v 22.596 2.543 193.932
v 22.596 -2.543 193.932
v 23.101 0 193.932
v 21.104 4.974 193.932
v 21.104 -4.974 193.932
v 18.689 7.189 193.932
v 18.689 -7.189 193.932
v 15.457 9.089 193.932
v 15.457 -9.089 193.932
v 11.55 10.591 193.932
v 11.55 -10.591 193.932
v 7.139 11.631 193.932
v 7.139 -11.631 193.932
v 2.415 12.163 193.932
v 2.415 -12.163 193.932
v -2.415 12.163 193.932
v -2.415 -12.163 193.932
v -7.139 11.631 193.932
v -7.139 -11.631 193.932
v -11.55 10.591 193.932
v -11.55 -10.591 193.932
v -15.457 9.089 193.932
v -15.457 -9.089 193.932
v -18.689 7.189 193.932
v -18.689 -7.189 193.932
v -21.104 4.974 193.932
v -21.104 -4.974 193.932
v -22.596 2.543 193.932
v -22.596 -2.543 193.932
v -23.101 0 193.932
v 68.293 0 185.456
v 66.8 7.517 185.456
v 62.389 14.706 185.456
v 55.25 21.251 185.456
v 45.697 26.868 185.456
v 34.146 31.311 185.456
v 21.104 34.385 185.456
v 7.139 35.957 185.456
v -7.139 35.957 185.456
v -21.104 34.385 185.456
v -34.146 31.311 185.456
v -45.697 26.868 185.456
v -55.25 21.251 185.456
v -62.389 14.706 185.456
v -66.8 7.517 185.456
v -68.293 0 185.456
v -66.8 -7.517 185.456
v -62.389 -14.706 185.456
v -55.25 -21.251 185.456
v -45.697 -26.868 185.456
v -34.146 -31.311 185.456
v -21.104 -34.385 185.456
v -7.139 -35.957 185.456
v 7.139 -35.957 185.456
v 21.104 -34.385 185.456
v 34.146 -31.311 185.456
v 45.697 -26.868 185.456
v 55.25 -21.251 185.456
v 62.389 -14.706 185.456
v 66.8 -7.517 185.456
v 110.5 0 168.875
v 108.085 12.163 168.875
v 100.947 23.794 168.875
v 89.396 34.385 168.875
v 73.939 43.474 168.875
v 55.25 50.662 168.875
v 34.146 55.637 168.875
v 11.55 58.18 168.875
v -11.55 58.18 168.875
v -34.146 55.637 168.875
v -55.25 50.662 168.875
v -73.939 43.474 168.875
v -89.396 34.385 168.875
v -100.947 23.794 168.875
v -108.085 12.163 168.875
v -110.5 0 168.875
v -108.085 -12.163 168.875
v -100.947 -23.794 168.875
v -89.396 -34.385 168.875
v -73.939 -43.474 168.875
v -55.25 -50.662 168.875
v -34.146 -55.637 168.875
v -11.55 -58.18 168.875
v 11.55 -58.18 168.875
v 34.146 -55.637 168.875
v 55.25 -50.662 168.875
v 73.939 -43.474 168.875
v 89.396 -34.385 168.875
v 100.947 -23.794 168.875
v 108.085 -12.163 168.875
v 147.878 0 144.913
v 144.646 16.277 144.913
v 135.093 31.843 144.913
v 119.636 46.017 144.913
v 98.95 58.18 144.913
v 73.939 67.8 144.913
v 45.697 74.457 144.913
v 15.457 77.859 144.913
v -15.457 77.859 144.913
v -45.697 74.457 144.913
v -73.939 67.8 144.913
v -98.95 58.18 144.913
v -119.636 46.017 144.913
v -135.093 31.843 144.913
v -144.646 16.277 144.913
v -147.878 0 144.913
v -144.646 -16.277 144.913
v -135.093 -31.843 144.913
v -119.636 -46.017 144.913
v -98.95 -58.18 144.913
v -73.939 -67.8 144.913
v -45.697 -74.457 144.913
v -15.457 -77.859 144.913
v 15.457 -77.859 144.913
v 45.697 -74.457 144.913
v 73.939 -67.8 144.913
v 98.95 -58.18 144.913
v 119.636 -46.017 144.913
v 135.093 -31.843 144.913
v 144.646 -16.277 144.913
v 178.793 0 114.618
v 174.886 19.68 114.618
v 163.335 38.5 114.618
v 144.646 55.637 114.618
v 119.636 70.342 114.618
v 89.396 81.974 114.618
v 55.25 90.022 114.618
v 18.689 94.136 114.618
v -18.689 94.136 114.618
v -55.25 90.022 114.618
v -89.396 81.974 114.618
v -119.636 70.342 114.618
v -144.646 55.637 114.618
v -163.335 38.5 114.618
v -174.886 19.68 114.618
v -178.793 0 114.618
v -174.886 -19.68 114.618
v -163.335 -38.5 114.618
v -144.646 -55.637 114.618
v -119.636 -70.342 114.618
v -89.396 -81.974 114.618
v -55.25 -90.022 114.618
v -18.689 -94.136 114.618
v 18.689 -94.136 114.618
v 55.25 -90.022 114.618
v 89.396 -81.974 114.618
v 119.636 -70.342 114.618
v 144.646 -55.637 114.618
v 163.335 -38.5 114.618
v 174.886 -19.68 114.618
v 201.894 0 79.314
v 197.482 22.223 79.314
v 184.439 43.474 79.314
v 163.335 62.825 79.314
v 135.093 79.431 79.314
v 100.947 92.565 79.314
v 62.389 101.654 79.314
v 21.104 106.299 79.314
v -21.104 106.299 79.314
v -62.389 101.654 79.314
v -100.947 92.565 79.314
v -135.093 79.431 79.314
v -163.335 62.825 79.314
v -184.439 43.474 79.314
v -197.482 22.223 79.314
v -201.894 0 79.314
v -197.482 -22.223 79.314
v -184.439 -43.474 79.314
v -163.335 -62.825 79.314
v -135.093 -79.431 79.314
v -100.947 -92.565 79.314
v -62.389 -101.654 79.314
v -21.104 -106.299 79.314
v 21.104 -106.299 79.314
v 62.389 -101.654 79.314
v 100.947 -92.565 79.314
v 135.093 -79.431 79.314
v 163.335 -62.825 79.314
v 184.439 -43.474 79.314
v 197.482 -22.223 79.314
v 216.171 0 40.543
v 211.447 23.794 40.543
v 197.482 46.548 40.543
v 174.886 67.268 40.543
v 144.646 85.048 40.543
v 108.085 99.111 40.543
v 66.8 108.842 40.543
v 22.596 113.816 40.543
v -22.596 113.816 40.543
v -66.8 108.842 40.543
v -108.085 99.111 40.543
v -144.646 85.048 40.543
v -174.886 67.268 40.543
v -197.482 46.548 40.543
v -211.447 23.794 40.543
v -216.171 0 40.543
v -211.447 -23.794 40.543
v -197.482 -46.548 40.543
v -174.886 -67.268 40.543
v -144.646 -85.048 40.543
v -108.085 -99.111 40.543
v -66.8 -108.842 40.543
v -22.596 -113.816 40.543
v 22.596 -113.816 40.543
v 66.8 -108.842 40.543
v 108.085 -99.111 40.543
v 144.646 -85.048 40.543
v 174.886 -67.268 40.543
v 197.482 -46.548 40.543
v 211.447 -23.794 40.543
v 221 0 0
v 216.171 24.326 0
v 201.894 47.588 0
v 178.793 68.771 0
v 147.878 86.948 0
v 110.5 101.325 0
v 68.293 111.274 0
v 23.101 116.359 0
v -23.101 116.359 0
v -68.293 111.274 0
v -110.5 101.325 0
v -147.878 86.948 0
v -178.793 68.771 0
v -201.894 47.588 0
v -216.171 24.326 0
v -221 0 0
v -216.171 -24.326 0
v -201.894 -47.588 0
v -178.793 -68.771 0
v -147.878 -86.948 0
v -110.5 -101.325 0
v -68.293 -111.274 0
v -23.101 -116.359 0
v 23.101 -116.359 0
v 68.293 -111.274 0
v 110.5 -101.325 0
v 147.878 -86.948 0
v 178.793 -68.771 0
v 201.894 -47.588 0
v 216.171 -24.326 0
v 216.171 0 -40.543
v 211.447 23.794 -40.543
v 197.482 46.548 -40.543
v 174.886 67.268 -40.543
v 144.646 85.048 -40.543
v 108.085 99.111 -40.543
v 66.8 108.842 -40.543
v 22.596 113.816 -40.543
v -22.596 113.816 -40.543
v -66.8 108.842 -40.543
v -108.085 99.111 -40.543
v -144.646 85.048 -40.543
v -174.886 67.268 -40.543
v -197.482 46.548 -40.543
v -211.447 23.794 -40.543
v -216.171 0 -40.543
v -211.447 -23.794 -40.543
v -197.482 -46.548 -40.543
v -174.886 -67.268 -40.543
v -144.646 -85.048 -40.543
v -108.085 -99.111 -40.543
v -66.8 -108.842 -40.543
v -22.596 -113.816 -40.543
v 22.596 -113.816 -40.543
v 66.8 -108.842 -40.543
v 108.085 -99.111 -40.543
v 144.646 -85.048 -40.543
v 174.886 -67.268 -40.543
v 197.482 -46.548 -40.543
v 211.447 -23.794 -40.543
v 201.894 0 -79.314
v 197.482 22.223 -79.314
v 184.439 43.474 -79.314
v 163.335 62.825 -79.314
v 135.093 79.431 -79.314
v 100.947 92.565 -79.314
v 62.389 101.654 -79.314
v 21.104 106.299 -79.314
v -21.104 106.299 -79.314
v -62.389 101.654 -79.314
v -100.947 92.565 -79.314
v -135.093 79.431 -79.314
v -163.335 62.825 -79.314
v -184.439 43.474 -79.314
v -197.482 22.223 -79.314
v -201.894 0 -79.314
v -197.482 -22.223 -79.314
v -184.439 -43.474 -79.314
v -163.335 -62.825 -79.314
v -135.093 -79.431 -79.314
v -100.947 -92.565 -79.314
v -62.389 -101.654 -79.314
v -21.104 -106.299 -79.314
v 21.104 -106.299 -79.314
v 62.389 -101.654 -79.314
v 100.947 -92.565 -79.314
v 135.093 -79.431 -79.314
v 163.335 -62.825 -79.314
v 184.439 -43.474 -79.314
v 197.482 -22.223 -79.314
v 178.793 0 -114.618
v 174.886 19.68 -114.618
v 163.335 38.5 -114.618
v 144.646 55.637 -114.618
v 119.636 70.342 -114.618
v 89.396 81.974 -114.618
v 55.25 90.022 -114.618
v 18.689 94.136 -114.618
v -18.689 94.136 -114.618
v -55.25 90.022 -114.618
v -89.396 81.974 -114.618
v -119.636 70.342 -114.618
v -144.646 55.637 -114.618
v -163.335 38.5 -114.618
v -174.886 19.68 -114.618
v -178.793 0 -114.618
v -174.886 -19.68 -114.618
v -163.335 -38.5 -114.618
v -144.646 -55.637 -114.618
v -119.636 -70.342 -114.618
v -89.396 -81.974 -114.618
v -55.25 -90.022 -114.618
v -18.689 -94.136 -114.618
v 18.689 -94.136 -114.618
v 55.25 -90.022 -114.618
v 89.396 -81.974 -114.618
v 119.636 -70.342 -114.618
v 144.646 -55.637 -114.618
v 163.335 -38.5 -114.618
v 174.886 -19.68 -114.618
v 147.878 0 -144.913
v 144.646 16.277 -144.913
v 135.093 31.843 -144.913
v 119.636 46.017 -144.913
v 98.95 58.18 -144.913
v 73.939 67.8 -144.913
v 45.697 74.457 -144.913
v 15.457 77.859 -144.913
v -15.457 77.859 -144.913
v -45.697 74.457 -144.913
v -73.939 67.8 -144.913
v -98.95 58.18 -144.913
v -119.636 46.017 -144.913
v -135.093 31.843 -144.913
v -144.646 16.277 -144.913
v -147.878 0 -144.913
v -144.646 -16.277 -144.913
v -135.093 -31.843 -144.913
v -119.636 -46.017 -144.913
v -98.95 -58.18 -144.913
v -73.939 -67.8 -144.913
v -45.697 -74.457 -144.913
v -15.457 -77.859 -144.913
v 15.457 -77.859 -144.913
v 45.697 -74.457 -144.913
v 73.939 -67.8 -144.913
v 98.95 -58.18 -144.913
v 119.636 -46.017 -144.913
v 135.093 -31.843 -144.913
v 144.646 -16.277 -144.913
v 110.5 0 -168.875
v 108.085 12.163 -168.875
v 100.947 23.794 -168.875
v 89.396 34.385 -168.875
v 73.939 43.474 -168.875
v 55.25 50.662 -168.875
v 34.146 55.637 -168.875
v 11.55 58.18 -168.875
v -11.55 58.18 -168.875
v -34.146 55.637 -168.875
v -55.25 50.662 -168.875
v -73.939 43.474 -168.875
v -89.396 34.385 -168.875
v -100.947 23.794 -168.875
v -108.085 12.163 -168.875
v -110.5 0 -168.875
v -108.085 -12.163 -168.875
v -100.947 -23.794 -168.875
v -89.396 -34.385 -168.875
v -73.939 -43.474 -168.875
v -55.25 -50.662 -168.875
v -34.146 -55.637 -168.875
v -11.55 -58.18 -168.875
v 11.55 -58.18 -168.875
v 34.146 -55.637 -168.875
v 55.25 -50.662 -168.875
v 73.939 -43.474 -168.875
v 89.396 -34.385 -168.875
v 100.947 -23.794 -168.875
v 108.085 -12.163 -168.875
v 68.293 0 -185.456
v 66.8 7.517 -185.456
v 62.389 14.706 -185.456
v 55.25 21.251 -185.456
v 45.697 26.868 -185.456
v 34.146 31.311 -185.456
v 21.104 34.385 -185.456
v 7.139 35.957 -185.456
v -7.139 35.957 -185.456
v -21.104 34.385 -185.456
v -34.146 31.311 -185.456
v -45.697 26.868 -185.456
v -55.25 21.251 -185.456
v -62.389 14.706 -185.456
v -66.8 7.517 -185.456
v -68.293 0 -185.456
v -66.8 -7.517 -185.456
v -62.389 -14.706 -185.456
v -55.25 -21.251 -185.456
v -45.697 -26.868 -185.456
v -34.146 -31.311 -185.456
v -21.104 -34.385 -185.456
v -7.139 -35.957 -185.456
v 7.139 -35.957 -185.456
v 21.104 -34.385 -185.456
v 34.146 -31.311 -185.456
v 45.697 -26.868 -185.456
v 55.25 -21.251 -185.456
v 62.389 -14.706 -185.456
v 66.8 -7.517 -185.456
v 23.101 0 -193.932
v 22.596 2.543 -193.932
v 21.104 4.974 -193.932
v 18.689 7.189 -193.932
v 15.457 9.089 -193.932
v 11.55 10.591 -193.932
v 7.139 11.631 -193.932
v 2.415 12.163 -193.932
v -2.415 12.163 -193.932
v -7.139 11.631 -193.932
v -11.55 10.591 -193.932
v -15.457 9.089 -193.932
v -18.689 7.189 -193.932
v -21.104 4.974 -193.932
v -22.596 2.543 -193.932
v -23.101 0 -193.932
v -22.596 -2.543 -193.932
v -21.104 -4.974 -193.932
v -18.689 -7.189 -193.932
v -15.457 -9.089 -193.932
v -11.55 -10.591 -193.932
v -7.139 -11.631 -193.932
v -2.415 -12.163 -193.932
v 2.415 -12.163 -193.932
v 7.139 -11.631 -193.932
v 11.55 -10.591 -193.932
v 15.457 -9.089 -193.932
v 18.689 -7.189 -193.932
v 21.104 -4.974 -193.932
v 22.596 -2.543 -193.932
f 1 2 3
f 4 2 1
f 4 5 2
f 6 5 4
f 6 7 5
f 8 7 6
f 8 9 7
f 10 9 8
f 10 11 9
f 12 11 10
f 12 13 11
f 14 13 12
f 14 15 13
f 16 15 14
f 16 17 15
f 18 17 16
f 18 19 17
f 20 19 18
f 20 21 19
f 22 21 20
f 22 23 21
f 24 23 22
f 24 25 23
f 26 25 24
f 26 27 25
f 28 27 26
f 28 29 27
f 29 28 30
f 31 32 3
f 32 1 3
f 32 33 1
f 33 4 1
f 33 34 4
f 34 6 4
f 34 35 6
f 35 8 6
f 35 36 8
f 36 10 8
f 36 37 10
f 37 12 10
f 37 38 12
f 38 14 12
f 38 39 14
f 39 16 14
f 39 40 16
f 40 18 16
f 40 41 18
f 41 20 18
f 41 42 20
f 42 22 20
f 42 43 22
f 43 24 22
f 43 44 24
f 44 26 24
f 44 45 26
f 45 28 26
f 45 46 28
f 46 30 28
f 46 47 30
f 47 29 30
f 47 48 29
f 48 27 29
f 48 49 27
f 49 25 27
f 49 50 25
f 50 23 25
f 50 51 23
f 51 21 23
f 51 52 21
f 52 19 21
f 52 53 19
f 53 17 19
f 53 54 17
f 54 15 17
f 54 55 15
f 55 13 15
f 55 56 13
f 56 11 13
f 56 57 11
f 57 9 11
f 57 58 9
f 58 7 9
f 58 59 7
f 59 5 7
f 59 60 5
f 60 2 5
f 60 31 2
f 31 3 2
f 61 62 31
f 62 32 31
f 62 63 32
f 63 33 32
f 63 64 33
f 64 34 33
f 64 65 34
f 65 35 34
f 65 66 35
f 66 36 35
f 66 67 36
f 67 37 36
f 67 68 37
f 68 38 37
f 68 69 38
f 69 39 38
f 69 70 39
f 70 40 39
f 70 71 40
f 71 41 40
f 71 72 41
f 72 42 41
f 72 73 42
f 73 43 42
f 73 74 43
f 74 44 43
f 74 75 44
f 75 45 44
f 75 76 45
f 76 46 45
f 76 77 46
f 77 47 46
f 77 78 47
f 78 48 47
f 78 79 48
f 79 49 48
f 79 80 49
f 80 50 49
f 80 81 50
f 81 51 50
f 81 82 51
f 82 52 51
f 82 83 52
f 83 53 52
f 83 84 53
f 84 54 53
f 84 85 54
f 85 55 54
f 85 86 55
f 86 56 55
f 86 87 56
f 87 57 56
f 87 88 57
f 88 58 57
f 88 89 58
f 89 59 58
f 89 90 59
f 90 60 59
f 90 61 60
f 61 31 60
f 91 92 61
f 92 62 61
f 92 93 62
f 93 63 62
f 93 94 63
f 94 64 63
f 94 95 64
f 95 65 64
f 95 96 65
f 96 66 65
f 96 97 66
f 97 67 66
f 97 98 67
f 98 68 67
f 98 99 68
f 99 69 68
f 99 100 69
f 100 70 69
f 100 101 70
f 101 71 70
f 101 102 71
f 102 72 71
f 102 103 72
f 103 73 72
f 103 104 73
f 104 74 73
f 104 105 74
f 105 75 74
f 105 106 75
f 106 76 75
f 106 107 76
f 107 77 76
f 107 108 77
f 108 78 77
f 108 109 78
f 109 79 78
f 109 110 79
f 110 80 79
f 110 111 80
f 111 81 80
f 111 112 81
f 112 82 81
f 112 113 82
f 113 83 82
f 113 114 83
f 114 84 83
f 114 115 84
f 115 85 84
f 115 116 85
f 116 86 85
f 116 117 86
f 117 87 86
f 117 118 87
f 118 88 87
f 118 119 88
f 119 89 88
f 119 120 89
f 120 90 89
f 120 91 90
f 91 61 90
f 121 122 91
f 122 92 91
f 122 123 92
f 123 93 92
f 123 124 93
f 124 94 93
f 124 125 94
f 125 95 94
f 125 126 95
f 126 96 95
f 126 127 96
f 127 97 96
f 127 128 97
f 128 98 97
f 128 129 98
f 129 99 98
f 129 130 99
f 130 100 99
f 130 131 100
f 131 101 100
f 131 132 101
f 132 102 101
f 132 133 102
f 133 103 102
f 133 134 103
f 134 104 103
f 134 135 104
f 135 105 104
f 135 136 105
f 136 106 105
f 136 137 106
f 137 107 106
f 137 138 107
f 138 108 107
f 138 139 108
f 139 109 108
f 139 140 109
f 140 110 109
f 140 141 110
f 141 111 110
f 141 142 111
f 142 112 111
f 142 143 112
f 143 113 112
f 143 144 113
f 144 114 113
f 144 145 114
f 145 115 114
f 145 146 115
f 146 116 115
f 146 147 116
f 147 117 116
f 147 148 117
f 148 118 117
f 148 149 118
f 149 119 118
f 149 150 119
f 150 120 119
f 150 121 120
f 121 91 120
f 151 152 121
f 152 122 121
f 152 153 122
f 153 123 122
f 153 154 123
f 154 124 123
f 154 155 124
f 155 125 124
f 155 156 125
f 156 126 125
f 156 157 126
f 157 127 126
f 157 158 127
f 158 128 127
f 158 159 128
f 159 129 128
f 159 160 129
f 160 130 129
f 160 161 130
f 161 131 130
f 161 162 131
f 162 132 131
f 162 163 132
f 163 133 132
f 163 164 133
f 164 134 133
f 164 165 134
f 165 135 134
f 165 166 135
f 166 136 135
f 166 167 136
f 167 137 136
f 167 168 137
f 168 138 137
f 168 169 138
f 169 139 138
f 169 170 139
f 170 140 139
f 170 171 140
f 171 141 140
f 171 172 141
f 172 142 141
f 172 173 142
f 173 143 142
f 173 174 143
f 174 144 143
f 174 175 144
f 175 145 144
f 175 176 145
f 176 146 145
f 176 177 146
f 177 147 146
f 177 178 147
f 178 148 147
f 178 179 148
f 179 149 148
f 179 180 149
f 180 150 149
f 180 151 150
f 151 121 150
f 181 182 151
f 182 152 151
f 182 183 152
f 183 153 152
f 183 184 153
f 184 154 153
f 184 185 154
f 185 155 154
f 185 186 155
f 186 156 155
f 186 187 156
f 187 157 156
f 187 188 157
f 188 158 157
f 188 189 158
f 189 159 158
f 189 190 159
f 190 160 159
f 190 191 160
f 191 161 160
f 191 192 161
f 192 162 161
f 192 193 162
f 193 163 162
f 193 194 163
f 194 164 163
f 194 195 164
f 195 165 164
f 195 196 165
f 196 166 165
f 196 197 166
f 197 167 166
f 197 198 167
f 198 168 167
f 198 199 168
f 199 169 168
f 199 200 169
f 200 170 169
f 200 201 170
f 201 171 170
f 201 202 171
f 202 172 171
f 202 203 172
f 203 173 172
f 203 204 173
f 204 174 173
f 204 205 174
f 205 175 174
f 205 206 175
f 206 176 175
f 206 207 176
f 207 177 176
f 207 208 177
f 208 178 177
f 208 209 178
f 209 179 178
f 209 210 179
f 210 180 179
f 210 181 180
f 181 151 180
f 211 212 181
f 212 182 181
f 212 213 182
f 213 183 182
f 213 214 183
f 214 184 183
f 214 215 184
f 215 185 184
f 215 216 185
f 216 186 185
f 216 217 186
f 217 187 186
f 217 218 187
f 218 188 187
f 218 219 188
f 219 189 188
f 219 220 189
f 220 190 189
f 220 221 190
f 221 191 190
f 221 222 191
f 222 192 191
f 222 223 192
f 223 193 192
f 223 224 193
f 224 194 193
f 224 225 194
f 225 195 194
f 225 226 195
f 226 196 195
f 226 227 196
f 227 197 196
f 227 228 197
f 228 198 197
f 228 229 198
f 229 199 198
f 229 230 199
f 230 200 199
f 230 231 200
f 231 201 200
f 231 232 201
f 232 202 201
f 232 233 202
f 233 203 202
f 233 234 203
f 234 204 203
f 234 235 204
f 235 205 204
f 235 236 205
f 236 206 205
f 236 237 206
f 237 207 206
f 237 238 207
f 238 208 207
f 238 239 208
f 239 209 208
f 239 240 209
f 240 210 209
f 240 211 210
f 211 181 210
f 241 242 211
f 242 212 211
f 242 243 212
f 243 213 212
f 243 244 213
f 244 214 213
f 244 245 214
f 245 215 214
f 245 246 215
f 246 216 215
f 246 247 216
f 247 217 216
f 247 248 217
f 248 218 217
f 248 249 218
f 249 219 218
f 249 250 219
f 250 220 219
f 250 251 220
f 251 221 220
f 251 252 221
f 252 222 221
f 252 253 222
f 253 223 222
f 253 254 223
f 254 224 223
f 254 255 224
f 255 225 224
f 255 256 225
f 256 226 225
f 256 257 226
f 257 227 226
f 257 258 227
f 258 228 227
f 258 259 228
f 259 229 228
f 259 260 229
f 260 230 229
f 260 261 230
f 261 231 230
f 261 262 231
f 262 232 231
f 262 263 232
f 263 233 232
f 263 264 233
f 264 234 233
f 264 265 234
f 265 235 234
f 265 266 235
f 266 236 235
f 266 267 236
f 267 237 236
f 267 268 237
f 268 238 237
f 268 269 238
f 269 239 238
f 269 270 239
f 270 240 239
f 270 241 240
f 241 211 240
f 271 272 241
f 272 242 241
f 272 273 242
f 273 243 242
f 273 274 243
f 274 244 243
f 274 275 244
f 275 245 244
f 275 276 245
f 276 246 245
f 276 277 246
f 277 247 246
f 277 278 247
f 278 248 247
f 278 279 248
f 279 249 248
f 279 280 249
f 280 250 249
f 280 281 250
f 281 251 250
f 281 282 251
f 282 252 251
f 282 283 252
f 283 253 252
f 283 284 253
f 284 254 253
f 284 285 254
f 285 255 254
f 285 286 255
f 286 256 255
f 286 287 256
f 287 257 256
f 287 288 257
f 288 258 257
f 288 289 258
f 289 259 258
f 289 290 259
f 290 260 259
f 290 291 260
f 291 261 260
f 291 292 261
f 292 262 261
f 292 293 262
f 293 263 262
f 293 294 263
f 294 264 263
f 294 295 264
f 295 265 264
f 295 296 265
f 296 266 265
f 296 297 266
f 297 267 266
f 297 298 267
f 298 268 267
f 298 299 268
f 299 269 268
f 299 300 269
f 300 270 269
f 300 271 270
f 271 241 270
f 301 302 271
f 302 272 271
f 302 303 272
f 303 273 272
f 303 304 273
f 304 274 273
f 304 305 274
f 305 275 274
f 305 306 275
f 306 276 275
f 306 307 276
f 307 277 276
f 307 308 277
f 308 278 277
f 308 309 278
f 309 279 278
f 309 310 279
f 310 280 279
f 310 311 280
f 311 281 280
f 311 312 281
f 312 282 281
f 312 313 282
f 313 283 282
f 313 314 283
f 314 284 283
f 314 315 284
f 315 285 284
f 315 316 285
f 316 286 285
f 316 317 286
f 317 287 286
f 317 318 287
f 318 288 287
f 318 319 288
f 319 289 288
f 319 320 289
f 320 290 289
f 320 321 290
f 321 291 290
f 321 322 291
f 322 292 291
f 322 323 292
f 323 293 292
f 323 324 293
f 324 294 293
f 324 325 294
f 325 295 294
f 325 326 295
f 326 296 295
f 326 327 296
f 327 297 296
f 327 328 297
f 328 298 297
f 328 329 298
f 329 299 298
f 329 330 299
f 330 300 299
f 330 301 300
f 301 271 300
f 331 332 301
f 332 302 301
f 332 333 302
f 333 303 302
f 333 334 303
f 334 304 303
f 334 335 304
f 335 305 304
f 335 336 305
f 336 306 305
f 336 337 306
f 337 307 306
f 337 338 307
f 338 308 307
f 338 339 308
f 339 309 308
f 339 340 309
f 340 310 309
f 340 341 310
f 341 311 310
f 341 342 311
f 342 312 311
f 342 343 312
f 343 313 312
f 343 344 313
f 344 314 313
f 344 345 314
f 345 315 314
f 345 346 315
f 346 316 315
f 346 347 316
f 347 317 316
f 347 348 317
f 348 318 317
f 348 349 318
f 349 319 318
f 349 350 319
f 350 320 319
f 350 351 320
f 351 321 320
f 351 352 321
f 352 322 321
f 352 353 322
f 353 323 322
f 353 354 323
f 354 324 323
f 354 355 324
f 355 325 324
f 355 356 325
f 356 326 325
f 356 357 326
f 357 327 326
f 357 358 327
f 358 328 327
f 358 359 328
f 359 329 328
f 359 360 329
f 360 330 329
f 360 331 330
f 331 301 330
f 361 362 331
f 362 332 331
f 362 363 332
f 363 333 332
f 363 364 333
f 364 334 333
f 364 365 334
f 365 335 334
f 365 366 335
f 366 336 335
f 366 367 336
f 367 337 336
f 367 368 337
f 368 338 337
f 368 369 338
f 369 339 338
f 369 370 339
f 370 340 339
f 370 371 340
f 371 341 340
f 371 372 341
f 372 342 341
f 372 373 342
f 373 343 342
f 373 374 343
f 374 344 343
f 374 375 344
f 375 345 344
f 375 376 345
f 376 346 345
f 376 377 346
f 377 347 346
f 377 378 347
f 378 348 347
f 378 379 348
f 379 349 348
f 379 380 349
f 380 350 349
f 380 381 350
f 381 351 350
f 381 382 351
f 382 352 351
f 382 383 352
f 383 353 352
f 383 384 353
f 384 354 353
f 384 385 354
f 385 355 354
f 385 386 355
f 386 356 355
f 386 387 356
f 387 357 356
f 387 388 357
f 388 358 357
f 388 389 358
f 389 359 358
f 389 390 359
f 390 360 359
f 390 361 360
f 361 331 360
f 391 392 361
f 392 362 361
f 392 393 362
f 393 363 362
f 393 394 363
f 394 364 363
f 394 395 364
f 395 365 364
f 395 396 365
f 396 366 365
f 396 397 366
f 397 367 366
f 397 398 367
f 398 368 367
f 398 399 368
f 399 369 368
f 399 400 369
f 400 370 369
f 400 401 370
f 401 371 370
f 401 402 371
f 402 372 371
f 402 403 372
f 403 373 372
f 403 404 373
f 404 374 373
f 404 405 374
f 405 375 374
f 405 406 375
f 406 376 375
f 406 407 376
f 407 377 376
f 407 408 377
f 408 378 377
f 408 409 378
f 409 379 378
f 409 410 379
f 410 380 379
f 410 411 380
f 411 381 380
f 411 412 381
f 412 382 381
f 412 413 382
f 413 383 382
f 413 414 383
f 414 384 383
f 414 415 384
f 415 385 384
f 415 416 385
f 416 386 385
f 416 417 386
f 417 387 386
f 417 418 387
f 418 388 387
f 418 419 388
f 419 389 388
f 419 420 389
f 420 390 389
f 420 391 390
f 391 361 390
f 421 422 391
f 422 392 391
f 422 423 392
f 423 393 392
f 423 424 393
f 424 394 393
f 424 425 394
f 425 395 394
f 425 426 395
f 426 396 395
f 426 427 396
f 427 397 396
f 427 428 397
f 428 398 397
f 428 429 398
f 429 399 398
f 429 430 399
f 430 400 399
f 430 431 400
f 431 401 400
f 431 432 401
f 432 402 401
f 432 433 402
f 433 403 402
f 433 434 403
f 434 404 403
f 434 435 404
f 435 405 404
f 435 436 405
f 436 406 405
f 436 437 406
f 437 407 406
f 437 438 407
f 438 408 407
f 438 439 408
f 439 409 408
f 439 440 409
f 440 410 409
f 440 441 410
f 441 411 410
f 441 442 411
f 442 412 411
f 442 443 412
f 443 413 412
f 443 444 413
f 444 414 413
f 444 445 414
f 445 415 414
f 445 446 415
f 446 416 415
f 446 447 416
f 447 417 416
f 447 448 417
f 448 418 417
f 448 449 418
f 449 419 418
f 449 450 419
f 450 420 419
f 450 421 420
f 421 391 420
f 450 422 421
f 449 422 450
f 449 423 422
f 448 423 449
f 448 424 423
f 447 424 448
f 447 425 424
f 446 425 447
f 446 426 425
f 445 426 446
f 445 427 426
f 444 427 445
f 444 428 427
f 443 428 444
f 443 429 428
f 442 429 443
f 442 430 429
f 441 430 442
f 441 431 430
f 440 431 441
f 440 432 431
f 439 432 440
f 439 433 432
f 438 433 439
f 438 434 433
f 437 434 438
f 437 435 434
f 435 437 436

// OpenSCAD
// Generated by SolidPython 1.0.1 on 2020-07-29 00:46:53


scale(v = [17, 9, 15]) {
	sphere(r = 13);
}
/***********************************************
*********      SolidPython code:      **********
************************************************
 
# import packages: SolidPython
from solid import *
from solid.utils import *
from itertools import chain, combinations, permutations


class Resize:

    def __init__(self, scad_file):
        self.scad_file = scad_file
        #self.scad_file = import_scad(scad_file)
        # cone/cylinder param:
        self.r1 = 0
        self.r2 = 0
        self.h = 0
        # rectangular prism param:
        self.w = 0
        self.l = 0
        # ellipse param:
        self.r = 0

    # import OpenScad code (file name corresponds to shape)


    # classify shape + parameters
    def assign(self, param1, param2, param3):
        if self.scad_file == 'cone.scad':
            self.r1 = param1
            self.r2 = param2
            self.h = param3
        elif self.scad_file == 'cylinder.scad':
            self.r1 = param1
            self.r2 = param2
            self.h = param3
        elif self.scad_file == 'rectangularPrism.scad':
            self.h = param1
            self.l = param2
            self.w = param3
        else:
            self.r = param1
            self.h = param2

    # resize parameters
    def iterate(self):
        x = range(3, 20, 2)
        i = 1
        if self.scad_file == 'cone.scad':
            tempList = list(permutations(x, 2))
            for temp in tempList:
                param1 = temp[0]
                param2 = temp[1]
                filepath = 'produced_scad_files/' + 'cone' + str(param1) + '_' + str(param2) + '_' + '.scad'
                scad_render_to_file(cylinder(h=param1, r1=param2, r2=0), filepath)

        elif self.scad_file == 'cylinder.scad':
            tempList = list(permutations(x, 3))
            for temp in tempList:
                param1 = temp[0]
                param2 = temp[1]
                filepath = 'produced_scad_files/' + 'cylinder' + str(param1) + '_' + str(param2) + '_' + '.scad'
                scad_render_to_file(cylinder(h=param1, r1=param2, r2=param2), filepath)

        elif self.scad_file == 'rectangularPrism.scad':
            tempList = list(permutations(x, 3))
            for temp in tempList:
                param1 = temp[0]
                param2 = temp[1]
                param3 = temp[2]
                filepath = 'produced_scad_files/' + 'rectangularPrism' + str(param1) + '_' + str(param2) + '_' + str(
                    param3) + '.scad'
                scad_render_to_file(cube(size=(param1, param2, param3)), filepath)

        elif self.scad_file == 'ellipse.scad':
            tempList = list(permutations(x, 4))
            for temp in tempList:
                param1 = temp[0]
                param2 = temp[1]
                param3 = temp[2]
                param4 = temp[3]
                filepath = 'produced_scad_files/' + 'ellipse' + str(param1) + '_' + str(param2) + '_' + str(param3) + '_' + str(param4) + '.scad'
                scad_render_to_file(scale([param1, param2, param3])(sphere(r=param4)), filepath)

    def render_to_scadfile(self):
        scad_render_to_file(scad, 'example.scad') 
 
************************************************/
